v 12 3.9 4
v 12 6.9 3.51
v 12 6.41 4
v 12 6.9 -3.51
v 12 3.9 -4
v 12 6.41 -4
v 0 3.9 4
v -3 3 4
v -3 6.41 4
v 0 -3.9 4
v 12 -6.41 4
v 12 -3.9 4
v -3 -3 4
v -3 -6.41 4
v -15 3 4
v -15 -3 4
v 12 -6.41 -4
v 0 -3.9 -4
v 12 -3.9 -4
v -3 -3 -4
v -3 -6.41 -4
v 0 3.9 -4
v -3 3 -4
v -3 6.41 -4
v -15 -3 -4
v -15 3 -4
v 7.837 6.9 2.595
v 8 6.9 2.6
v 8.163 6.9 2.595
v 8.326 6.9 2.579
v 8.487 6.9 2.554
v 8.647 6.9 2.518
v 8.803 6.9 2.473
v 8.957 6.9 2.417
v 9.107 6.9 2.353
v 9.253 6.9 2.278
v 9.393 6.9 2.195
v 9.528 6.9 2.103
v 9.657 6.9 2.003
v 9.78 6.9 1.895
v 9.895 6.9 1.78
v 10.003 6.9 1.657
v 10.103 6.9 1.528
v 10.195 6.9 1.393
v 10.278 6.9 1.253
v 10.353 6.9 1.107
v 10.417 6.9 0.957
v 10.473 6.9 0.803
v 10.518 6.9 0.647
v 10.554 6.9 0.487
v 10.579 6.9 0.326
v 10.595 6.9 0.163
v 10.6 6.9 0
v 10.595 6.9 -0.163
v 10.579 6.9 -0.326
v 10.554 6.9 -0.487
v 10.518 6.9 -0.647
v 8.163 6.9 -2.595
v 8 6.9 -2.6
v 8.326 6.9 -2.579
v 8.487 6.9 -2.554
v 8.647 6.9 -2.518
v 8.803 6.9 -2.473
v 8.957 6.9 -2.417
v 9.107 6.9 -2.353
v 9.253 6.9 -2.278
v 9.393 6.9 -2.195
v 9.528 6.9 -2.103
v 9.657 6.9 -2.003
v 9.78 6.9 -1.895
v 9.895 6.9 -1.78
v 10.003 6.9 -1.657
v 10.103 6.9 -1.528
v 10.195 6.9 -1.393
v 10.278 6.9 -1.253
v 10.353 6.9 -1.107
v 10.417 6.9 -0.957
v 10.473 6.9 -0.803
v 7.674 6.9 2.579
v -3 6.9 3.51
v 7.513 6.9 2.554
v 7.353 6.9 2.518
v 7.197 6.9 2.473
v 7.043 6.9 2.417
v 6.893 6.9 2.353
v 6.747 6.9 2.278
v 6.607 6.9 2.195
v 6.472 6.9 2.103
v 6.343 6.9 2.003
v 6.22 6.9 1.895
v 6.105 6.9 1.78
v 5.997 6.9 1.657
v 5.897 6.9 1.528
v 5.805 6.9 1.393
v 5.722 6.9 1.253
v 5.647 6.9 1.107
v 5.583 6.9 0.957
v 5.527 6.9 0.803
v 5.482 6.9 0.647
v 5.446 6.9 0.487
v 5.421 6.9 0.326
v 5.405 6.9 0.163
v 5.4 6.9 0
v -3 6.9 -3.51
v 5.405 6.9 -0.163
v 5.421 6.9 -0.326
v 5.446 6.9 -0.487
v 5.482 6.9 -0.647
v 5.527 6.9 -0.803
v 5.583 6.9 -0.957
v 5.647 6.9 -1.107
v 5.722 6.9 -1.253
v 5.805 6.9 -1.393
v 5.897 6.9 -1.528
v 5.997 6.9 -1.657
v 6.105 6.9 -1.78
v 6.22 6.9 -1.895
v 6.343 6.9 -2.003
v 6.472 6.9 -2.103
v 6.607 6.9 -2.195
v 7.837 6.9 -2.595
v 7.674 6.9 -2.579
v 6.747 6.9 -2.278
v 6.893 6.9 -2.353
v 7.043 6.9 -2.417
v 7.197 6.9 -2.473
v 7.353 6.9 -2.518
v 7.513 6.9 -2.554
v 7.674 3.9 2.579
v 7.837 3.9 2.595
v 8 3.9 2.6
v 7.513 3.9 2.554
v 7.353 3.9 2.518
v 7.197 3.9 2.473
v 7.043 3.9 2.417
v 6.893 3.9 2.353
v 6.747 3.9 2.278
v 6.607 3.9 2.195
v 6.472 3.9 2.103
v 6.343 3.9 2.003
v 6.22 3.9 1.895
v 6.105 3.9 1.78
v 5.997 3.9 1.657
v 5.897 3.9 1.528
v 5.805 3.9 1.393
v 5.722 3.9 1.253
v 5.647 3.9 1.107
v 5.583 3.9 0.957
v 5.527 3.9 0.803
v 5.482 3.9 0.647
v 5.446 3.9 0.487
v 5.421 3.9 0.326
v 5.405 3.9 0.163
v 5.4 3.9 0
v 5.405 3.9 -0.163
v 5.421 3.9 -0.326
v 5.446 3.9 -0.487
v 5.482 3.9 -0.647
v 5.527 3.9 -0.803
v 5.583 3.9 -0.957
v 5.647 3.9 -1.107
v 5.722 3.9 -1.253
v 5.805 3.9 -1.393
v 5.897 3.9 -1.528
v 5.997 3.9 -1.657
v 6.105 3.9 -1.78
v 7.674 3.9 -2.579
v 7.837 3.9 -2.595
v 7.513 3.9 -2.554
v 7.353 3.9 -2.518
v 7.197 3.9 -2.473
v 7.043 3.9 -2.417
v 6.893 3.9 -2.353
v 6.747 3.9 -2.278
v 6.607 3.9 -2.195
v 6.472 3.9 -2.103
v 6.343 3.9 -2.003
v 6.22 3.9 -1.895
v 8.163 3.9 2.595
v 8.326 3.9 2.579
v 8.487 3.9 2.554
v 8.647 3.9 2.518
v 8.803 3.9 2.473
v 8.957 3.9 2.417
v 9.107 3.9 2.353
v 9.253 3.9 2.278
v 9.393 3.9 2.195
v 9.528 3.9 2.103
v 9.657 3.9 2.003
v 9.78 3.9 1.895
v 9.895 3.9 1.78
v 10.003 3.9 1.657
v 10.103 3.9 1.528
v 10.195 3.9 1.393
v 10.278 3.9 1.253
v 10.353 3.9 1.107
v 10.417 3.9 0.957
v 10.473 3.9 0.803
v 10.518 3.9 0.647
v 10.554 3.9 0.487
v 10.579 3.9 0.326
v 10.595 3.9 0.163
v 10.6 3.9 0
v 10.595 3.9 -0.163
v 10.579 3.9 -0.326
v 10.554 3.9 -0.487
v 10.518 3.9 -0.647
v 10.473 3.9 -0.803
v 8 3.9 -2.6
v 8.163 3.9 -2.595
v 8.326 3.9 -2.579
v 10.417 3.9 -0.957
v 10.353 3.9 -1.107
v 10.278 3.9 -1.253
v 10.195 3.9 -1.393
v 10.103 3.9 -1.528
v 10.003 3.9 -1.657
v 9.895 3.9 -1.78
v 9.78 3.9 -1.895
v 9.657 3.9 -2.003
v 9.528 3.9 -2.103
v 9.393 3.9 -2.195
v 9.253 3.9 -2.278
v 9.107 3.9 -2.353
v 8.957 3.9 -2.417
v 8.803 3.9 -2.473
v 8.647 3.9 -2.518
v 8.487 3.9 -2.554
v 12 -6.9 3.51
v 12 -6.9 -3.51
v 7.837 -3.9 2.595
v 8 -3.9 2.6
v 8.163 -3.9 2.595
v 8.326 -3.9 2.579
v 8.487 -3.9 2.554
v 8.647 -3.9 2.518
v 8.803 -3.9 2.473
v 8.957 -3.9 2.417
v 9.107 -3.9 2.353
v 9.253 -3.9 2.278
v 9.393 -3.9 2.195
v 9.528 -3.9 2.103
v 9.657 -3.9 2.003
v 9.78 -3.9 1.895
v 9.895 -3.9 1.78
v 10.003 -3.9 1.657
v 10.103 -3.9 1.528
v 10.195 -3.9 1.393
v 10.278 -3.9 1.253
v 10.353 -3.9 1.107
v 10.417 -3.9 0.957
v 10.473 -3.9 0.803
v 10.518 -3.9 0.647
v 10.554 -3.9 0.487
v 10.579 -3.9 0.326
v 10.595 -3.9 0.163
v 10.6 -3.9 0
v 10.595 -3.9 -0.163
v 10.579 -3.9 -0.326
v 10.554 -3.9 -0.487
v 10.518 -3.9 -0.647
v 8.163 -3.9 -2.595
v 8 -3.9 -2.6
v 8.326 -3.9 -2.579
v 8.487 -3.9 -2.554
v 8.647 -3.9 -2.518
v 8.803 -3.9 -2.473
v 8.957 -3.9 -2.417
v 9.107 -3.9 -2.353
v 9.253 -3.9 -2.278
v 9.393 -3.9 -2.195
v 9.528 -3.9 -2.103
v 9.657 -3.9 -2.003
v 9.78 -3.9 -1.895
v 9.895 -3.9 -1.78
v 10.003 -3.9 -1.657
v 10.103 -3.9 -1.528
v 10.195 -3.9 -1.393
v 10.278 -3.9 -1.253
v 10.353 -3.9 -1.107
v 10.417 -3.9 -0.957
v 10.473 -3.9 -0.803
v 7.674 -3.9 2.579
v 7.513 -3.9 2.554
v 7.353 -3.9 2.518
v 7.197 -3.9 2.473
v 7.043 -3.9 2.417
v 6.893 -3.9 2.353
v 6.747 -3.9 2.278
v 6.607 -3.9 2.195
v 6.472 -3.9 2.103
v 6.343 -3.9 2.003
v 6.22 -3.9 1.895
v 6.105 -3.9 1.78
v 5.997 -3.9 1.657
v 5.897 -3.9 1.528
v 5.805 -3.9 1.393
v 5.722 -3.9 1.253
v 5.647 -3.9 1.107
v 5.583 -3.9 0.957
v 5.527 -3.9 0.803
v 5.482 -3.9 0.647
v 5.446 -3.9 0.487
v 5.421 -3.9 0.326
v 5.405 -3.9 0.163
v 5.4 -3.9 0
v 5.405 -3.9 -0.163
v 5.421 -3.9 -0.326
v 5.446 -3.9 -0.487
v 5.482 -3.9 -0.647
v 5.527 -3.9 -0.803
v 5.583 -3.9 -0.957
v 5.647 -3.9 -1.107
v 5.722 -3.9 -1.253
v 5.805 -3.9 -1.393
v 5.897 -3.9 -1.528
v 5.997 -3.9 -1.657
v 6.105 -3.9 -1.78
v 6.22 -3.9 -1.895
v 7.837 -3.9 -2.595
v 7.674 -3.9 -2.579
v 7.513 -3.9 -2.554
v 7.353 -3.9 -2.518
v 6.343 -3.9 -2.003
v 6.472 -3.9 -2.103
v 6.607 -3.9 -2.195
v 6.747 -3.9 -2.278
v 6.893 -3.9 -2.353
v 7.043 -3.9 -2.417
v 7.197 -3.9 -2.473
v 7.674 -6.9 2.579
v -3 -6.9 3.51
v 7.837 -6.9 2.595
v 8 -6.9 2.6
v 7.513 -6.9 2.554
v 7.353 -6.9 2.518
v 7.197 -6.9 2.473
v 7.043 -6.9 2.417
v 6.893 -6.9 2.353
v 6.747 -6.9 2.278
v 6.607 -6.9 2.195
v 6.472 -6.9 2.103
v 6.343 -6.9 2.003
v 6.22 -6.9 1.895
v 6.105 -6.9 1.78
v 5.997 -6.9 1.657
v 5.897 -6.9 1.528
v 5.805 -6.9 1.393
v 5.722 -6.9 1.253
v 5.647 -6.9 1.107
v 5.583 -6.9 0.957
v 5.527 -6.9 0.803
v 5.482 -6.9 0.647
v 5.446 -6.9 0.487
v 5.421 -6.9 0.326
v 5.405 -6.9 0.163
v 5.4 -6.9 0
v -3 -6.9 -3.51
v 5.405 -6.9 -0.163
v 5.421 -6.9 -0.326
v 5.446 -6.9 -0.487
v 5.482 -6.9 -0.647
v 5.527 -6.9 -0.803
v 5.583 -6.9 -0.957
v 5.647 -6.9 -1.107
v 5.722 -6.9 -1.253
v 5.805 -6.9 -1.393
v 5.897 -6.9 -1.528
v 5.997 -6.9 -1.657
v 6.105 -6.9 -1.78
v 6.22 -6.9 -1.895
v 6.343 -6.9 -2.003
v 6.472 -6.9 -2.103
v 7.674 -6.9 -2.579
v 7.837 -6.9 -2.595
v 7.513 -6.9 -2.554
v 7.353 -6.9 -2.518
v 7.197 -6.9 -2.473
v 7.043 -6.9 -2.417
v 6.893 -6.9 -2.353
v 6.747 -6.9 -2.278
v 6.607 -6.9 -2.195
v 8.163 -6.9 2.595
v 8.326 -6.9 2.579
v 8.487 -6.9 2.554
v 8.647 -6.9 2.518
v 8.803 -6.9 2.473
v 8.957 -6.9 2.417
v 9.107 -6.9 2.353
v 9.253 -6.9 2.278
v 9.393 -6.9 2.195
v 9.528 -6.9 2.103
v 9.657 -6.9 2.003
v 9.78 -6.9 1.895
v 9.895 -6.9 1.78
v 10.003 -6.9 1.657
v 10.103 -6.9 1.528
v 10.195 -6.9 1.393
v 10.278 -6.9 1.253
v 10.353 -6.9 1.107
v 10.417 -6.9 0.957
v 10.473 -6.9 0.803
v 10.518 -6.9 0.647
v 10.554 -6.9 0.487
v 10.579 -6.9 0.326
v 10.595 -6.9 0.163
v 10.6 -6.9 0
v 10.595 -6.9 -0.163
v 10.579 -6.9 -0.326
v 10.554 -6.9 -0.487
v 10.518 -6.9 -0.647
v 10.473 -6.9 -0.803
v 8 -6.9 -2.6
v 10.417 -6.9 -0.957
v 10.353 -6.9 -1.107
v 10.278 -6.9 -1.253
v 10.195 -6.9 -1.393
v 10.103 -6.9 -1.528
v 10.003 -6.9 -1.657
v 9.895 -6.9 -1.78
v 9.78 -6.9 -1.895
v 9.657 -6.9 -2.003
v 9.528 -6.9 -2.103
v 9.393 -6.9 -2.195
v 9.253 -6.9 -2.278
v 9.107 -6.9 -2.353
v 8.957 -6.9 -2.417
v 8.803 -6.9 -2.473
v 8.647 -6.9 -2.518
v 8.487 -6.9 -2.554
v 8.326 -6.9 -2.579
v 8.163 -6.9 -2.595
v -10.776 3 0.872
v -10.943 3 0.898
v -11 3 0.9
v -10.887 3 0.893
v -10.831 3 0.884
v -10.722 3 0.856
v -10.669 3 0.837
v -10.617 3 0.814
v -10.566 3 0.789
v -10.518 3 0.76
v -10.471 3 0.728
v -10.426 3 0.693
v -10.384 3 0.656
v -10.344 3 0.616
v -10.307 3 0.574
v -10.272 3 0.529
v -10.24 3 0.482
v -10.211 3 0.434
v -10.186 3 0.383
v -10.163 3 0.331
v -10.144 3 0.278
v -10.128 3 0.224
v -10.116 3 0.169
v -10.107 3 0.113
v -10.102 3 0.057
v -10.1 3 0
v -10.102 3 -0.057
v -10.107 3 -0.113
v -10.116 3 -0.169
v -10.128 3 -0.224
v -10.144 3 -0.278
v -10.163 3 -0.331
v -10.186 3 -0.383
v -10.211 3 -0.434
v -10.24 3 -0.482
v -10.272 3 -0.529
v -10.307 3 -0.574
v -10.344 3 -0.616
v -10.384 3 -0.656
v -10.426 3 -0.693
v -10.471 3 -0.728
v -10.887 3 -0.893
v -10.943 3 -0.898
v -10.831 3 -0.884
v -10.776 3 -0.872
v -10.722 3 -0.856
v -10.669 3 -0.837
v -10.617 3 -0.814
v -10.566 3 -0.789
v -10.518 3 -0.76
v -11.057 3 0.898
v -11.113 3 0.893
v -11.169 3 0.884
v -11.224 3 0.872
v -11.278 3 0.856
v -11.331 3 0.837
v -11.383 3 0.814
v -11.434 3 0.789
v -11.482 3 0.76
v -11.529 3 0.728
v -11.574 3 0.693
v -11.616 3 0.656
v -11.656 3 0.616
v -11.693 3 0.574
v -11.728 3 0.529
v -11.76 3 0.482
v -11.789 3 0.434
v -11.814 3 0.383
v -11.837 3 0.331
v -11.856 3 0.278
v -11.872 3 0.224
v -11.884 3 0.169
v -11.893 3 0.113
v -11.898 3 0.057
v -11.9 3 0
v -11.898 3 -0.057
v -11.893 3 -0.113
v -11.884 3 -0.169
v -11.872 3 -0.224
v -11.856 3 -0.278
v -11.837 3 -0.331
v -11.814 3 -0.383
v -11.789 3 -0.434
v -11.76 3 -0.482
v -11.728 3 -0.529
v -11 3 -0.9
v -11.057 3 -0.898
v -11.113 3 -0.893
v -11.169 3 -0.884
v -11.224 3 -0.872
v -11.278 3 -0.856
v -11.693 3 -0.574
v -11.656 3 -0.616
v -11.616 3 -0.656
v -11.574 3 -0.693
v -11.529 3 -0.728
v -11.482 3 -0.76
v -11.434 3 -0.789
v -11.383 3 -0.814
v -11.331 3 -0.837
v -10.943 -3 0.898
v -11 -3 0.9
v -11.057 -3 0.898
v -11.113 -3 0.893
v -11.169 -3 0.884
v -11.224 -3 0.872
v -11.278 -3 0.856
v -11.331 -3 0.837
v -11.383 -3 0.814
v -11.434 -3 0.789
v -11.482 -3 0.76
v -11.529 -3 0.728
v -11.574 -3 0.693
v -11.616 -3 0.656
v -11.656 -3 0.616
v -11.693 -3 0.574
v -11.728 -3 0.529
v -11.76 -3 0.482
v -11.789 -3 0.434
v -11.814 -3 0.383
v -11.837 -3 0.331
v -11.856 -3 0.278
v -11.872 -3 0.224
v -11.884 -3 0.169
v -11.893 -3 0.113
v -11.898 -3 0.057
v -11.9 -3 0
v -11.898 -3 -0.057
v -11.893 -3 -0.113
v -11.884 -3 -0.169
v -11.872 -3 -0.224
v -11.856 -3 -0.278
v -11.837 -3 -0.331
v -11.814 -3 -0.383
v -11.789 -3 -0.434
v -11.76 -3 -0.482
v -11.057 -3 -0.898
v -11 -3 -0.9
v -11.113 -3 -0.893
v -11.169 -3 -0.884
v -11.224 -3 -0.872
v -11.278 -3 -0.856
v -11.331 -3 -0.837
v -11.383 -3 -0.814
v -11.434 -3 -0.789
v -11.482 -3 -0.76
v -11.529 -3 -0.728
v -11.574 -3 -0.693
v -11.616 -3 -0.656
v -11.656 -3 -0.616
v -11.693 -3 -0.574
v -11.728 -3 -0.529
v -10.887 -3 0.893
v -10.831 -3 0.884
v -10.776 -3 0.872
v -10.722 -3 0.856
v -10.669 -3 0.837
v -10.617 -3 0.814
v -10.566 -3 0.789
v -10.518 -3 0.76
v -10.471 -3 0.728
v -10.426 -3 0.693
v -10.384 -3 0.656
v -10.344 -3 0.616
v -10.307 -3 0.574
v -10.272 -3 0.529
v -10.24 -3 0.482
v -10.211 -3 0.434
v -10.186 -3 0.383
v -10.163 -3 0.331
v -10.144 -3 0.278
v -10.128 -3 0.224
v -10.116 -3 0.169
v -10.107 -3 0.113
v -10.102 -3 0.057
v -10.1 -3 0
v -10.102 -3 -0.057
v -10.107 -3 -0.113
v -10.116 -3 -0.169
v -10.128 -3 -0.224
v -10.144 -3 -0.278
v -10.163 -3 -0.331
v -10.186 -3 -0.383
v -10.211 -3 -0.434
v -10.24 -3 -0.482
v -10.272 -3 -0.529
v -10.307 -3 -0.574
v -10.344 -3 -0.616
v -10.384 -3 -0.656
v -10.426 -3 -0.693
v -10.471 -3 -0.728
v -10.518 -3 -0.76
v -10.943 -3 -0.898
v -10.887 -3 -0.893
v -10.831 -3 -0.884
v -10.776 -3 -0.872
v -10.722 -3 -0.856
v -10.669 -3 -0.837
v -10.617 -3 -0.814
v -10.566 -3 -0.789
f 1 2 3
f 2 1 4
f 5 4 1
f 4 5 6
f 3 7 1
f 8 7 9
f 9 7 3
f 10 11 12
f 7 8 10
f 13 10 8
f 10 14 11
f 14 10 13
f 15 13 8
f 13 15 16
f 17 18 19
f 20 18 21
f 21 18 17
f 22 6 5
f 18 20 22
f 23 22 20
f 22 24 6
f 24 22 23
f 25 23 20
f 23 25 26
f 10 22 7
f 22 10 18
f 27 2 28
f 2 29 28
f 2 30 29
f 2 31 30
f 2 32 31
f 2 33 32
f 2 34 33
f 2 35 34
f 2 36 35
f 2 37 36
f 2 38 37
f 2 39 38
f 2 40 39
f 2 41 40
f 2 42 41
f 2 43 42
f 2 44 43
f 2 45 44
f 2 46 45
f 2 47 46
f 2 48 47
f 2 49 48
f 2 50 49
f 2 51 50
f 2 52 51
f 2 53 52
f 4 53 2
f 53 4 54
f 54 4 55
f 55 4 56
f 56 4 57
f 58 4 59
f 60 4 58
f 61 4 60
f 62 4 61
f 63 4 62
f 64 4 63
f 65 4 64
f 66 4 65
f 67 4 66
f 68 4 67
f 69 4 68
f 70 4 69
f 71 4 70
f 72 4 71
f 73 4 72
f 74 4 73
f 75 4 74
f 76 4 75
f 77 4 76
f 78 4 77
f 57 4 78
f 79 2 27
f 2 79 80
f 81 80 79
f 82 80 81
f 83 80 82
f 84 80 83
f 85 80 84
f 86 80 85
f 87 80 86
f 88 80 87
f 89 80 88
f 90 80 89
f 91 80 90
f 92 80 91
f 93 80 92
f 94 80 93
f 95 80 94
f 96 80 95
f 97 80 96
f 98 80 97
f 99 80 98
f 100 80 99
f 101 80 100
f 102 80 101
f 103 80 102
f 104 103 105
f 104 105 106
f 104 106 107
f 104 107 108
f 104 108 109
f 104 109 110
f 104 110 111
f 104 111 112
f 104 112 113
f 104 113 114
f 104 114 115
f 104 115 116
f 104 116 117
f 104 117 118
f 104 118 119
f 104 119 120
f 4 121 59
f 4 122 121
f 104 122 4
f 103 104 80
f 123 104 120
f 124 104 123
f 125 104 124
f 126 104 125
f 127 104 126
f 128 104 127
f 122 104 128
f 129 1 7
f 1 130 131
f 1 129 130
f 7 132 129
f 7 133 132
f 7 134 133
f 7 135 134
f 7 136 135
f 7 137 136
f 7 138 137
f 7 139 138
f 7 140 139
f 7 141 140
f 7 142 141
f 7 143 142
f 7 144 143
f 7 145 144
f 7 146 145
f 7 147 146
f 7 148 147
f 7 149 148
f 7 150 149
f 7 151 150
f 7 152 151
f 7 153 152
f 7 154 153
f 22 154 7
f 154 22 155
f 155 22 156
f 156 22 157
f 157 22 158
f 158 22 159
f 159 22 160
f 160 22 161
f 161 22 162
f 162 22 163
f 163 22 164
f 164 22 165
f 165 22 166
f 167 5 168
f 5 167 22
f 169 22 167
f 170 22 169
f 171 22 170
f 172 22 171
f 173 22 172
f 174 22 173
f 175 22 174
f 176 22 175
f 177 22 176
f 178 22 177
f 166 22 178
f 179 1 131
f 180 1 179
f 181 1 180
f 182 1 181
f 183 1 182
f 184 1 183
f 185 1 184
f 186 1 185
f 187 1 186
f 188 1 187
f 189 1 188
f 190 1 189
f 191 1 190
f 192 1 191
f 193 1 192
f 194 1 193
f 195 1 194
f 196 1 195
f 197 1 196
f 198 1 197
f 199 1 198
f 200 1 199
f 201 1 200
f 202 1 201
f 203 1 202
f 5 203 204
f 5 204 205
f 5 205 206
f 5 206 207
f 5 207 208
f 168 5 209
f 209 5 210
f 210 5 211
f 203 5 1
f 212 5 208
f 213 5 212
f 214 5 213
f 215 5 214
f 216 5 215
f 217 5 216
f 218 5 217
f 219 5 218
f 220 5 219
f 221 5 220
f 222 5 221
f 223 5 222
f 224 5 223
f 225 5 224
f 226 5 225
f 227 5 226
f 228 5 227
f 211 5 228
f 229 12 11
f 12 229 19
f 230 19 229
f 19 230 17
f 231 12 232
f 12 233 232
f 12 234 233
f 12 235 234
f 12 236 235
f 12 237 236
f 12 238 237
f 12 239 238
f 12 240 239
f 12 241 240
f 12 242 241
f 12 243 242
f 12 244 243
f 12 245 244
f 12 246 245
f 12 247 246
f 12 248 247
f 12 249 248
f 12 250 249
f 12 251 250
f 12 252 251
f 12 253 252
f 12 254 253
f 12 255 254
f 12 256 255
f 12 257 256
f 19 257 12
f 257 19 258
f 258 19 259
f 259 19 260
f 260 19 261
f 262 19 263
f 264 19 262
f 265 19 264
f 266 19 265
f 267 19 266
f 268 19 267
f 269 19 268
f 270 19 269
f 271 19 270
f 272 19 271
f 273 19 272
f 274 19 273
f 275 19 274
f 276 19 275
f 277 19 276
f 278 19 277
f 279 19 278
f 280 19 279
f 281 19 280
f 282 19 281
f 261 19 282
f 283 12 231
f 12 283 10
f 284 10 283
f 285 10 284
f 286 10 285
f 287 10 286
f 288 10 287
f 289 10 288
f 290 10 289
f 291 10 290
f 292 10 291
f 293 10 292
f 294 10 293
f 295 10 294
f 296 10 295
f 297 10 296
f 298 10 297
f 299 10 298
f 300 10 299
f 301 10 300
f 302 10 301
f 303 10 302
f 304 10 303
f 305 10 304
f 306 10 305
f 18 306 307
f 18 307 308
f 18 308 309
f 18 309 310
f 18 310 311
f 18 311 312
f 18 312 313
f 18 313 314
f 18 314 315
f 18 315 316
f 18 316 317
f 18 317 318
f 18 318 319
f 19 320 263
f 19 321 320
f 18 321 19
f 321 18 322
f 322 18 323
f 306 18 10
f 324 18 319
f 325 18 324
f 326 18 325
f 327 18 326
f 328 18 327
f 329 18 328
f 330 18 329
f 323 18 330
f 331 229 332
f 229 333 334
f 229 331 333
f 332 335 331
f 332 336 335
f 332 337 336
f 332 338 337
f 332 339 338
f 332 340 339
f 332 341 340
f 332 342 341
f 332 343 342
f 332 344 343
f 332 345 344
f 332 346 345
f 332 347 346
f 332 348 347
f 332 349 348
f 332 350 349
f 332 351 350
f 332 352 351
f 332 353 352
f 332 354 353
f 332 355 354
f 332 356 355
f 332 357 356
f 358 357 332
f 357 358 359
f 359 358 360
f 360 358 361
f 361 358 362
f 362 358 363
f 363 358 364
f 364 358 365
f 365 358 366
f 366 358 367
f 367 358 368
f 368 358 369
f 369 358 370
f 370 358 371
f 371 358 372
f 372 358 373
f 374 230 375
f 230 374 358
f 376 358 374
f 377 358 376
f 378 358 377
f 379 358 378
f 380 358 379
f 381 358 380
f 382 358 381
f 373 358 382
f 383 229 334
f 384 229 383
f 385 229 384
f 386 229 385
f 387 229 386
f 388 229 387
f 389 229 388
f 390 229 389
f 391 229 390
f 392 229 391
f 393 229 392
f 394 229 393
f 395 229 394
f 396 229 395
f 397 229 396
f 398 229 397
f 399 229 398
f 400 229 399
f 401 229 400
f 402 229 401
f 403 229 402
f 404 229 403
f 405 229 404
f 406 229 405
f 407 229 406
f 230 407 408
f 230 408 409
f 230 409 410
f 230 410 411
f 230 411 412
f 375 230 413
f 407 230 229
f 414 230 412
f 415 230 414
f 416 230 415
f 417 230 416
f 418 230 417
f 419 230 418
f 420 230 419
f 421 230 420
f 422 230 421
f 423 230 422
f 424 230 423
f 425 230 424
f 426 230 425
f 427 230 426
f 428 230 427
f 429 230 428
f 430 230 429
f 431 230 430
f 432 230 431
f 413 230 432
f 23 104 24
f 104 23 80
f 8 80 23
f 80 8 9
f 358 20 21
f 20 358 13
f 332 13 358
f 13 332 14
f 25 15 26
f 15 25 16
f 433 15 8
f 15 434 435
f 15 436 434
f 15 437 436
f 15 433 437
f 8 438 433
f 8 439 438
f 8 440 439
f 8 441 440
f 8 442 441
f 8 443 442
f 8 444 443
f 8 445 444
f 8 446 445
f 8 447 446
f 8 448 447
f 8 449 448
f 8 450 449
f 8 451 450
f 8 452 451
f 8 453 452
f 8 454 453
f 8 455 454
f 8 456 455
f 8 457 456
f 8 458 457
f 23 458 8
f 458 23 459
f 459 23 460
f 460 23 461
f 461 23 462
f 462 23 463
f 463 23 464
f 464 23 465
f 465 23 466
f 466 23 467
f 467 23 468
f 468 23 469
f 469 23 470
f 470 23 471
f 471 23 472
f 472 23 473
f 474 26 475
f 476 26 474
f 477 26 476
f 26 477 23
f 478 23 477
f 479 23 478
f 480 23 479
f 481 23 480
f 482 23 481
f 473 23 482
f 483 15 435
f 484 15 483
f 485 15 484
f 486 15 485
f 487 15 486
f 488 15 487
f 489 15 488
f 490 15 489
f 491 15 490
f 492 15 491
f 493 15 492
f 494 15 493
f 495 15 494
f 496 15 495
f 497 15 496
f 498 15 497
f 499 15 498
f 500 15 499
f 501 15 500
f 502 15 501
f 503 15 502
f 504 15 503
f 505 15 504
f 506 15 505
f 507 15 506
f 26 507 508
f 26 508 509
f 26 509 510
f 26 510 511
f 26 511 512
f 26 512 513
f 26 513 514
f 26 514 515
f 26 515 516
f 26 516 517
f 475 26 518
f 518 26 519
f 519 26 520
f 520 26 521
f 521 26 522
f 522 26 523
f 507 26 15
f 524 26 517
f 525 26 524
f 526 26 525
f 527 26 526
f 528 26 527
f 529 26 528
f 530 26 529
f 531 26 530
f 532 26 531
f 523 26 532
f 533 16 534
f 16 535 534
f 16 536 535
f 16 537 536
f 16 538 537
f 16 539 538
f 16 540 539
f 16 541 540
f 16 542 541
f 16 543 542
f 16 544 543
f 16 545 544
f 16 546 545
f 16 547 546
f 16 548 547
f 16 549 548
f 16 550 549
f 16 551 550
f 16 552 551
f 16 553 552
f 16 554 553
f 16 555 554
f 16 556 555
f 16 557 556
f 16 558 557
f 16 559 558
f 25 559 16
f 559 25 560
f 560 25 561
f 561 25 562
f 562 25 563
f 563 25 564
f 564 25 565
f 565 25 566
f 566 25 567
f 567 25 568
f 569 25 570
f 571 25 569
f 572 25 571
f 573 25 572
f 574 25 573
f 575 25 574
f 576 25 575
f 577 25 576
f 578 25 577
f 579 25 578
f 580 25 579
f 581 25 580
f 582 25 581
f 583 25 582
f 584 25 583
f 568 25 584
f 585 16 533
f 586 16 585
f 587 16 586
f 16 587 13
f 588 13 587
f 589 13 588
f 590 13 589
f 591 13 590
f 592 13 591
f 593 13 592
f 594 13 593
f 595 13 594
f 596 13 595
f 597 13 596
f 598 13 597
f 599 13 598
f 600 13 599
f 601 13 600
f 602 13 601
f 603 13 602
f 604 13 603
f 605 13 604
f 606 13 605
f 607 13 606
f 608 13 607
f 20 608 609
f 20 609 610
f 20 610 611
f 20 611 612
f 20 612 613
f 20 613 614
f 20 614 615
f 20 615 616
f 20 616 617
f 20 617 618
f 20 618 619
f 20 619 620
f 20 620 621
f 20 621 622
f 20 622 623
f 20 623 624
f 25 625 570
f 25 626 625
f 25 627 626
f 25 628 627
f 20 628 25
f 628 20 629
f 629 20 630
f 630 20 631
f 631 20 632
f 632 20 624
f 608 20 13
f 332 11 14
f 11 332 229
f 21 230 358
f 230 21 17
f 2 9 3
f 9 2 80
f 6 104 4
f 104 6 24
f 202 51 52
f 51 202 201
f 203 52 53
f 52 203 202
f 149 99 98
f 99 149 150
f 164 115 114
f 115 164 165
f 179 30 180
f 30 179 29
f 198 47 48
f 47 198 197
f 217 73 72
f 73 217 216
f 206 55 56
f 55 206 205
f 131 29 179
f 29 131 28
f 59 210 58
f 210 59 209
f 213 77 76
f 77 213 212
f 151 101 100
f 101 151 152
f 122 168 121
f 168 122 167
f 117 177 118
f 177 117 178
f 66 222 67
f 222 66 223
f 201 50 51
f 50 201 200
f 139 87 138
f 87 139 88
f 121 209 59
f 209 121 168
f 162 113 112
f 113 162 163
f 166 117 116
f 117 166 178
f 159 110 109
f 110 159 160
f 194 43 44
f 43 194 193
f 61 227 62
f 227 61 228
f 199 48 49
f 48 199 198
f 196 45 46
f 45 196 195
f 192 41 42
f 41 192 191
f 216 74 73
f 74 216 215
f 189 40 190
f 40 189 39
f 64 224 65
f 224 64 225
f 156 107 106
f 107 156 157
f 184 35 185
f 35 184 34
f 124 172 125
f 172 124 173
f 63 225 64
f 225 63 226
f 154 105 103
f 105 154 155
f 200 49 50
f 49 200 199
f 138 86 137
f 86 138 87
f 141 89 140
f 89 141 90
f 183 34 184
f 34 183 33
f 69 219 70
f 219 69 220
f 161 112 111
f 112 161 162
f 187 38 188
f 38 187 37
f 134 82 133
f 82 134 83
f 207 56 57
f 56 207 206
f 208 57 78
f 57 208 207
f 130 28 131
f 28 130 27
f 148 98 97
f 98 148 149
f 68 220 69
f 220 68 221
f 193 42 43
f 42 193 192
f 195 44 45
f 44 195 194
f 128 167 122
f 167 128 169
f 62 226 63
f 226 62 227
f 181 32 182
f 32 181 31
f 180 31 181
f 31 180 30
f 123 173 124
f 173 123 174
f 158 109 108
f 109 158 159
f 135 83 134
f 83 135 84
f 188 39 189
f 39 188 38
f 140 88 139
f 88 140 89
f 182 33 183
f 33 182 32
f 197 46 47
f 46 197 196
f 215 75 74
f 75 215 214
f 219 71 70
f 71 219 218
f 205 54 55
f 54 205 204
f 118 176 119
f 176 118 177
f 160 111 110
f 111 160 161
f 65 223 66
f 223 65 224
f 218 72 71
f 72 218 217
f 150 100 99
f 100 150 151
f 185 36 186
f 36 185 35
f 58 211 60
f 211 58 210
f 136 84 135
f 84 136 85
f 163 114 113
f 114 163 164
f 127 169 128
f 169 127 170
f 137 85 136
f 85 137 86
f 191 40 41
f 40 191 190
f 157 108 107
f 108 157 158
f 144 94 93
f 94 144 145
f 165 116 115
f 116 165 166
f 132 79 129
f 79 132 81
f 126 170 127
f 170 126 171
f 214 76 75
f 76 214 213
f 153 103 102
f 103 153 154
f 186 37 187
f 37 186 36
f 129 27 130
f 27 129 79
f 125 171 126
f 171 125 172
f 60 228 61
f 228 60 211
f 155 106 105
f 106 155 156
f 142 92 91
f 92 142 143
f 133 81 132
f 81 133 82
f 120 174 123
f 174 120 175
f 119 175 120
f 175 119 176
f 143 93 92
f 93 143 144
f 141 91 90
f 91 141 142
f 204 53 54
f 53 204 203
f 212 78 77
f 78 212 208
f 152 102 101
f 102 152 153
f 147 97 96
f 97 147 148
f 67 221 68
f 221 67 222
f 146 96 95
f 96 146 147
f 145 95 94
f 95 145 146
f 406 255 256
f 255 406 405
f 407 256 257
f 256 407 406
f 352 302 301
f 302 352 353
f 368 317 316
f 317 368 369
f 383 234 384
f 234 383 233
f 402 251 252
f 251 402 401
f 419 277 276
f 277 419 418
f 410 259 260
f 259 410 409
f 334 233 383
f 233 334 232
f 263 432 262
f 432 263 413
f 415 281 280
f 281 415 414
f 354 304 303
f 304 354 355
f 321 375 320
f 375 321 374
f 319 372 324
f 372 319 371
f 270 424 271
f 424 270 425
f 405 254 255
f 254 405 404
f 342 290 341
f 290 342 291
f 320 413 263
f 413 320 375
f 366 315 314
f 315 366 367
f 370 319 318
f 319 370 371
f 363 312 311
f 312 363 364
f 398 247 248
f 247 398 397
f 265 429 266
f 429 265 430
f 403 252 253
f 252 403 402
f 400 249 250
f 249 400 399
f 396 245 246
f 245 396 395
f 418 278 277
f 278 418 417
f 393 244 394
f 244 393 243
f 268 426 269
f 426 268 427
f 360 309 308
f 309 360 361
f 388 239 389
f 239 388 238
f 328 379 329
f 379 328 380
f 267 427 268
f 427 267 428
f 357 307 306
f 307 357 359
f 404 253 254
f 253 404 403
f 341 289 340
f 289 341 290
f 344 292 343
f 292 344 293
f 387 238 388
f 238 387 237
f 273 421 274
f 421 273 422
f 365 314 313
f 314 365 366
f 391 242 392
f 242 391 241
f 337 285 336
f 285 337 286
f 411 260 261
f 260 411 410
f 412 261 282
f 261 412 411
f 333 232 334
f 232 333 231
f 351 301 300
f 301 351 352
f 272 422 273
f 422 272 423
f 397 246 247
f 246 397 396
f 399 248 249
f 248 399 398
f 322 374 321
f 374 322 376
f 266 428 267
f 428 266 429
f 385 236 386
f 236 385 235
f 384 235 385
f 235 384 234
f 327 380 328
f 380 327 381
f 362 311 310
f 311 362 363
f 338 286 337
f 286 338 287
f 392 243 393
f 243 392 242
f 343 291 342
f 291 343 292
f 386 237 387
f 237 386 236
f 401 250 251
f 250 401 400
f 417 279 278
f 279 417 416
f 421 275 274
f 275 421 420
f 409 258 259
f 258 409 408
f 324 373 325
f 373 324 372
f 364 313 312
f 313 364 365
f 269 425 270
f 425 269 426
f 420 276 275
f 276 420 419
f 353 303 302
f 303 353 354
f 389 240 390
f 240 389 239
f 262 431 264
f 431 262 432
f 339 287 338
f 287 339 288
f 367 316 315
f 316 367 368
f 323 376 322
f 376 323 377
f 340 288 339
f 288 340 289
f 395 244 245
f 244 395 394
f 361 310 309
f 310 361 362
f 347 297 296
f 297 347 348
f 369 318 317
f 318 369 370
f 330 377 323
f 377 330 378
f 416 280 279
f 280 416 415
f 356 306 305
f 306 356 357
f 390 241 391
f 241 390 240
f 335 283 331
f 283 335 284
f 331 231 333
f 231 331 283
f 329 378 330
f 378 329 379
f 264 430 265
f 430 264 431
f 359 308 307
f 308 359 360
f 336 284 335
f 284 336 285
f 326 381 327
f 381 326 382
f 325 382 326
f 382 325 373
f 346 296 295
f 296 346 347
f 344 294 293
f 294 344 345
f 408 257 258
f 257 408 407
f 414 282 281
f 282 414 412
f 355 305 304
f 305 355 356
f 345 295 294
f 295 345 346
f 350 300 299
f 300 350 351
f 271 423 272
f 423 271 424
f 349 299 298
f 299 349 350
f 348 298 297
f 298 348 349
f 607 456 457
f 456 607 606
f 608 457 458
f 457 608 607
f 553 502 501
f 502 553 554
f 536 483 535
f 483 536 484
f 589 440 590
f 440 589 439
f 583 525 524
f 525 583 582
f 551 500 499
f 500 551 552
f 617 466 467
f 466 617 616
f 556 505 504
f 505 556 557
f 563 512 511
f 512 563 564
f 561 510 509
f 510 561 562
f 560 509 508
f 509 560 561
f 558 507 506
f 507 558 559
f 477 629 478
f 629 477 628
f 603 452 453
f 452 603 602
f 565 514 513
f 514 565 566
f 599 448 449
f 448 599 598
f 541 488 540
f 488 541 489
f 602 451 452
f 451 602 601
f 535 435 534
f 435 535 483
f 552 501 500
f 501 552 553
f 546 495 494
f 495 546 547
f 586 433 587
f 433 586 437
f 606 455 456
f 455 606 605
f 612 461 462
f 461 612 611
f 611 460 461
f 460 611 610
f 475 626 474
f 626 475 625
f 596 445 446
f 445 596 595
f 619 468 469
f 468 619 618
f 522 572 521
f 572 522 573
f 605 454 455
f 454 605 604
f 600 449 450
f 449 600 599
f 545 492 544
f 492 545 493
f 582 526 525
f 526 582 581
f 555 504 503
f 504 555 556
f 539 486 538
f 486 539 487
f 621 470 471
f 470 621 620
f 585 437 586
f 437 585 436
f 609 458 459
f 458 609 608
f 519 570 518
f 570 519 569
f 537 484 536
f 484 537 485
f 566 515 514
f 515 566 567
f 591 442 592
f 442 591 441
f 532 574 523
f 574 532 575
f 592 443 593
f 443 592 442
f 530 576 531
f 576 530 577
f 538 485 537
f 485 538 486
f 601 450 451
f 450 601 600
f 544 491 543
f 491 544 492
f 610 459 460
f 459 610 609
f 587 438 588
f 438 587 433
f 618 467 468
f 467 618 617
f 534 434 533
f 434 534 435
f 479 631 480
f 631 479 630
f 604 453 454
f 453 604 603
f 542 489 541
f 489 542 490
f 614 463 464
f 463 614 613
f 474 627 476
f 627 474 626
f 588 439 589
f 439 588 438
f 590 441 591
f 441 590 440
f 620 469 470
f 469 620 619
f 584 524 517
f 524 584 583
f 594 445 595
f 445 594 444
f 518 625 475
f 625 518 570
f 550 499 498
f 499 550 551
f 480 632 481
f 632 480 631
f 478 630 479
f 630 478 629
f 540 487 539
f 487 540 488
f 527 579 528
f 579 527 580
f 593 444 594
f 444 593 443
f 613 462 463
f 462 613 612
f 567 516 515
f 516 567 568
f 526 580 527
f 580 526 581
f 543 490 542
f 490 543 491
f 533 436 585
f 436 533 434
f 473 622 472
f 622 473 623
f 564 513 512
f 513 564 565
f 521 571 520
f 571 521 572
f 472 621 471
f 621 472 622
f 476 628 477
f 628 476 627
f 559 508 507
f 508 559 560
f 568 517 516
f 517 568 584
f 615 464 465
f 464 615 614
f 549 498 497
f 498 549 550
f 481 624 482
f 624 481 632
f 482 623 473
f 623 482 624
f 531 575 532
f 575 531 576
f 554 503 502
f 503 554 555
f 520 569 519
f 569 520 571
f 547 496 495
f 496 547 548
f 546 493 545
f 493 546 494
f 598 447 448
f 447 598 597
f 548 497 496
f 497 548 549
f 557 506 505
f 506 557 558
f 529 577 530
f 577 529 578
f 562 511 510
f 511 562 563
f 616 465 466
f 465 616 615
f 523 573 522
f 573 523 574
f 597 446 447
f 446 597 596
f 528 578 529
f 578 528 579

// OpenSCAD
// file: ../lib/bevel.scad
/*
 * Copyright (c) 2019, Vigibot
 * All rights reserved.
 * 
 * Redistribution and use in source and binary forms, with or without modification, are permitted provided that the following conditions are met:
 *   * Redistributions of source code must retain the above copyright notice, this list of conditions and the following disclaimer.
 *   * Redistributions in binary form must reproduce the above copyright notice, this list of conditions and the following disclaimer in the documentation and/or other materials provided with the distribution.
 * 
 * Description: OpenSCAD API for beveling
 * Design:      Gilles Bouissac
 * Author:      Gilles Bouissac
 */

use <extensions.scad>

MFG = 0.01; // 2 Manifold Guard
RADIUSBEVEL = 0.5; // Default radius bevel
CUTTER_W    = 1;

function getRadiusBevel() = RADIUSBEVEL;

// ----------------------------------------
//                  API
// ----------------------------------------

// Double diagonal bevels distant from width extruded in line
module bevelCutLinear( length, width, b=RADIUSBEVEL ) {
    // Cutter
    translate ( [-width/2-MFG, -CUTTER_W, 0] )
        cube( [width+2*MFG,CUTTER_W,length+2*MFG] );
    // Bevel
    mirrorY()
    translate ( [-width/2, 0, -MFG] )
    linear_extrude( height=length+2*MFG )
        bevelDiagonalSection ( b );
}

// Double diagonal bevels distant from width extruded in quater of circle
module bevelCutArc( radius, width, b=RADIUSBEVEL ) {
    // Cutter
    cutterCubeW = radius+CUTTER_W;
    translate ( [-radius, -radius, 0] )
        difference() {
            translate ( [cutterCubeW/2, cutterCubeW/2, 0] )
                cube( [cutterCubeW,cutterCubeW,width+2*MFG], center=true );
            cylinder( r=radius, h=width+4*MFG, center=true );
        }
    // Bevel
    mirrorZ()
    translate ( [-radius, -radius, 0] )
    rotate_extrude( angle=90 )
        translate ( [radius, width/2, 0] )
        rotate( [0,0,180] )
        bevelDiagonalSection ( b );
}
//
// ----------------------------------------
//            Implementation
// ----------------------------------------

// Section of a diagonal (linear 45 deg) bevel
module bevelDiagonalSection ( radius ) {
    polygon([
        [-MFG,       -MFG],
        [radius,     -MFG],
        [-MFG,       radius],
    ]);
}

// ----------------------------------------
//                 Showcase
// ----------------------------------------
translate ( [5, 0, 0] )
rotate( [90,0,0] )
rotate( [0,0,90] )
bevelCutLinear( 20, 2 );

translate ( [5, 5, 0] )
bevelCutArc( 5, 2, $fn=100 );
// file: ../lib/extensions.scad
/*
 * Copyright (c) 2019, Vigibot
 * All rights reserved.
 * 
 * Redistribution and use in source and binary forms, with or without modification, are permitted provided that the following conditions are met:
 *   * Redistributions of source code must retain the above copyright notice, this list of conditions and the following disclaimer.
 *   * Redistributions in binary form must reproduce the above copyright notice, this list of conditions and the following disclaimer in the documentation and/or other materials provided with the distribution.
 * 
 * Description: OpenSCAD extensions to scad language
 * Design:      Gilles Bouissac
 * Author:      Gilles Bouissac
 */


// Render children modules with mirroring on plane [XZ]
//   Each child is rendered 2 times
module mirrorX( mirrorx=true ) {
    mirror([0, 0, 0])
        children();
    if ( mirrorx )
        mirror([0, 1, 0])
            children();
}

// Render children modules with mirroring on plane [YZ]
//   Each child is rendered 2 times
module mirrorY( mirrory=true ) {
    mirror([0, 0, 0])
        children();
    if ( mirrory )
        mirror([1, 0, 0])
            children();
}

// Render children modules with mirroring on plane [XY]
//   Each child is rendered 2 times
module mirrorZ( mirrorz=true ) {
    mirror([0, 0, 0])
        children();
    if ( mirrorz )
        mirror([0, 0, 1])
            children();
}

// Render children modules with mirroring on X then mirroring on Y
//   Each child is rendered 4 times
module mirrorXY( mirrorx=true, mirrory=true ) {
    mirrorY(mirrory)
        mirrorX(mirrorx)
            children();
}

// flatten([[0,1],[2,3]]) => [0,1,2,3]
function flatten(list) = [ for (i = list, v = i) v ];
// main file
use <../lib/extensions.scad>
use <../lib/bevel.scad>

PRECISION = 100;

$fn = PRECISION;

HEIGHT = 8;
LENGTH = 12;
STANDWIDTH = 6;
ARMWIDTH = 3;
JOINTWIDTH = 3;
SPACE = 1.8; 
AXISOFFSET = 4;
ARMRADIUSHOLE = 2.6;
STANDRADIUSHOLE = 0.9;

module plate() {
 translate([LENGTH / 2 , ARMWIDTH/2 + STANDWIDTH/2 + SPACE/2, 0]) {  
  cube([LENGTH ,
        ARMWIDTH,
        HEIGHT], center = true);
 }
 translate([LENGTH / 2 , -(ARMWIDTH/2 + STANDWIDTH/2 + SPACE/2), 0]) {  
  cube([LENGTH ,
        ARMWIDTH,
        HEIGHT], center = true);
 }
 translate([-LENGTH / 2 - JOINTWIDTH , 0, 0]) {  
  cube([LENGTH ,
        STANDWIDTH,
        HEIGHT], center = true);
 }
 translate([- JOINTWIDTH /2 , 0, 0]) {  
  cube([JOINTWIDTH ,
        2 * ARMWIDTH + STANDWIDTH + SPACE,
        HEIGHT], center = true);
 }
}

module bevels() {
    translate([-ARMWIDTH , -(ARMWIDTH + STANDWIDTH/2 + SPACE/2), 0]) {  
        rotate([0,90,0])
            bevelCutLinear(LENGTH+ARMWIDTH,HEIGHT);
    }
}

module holes() {
 translate([LENGTH - AXISOFFSET , ARMWIDTH/2 + STANDWIDTH/2 + SPACE/2, 0]) {
  rotate([90,0,0]) {
   cylinder(r = ARMRADIUSHOLE, h = ARMWIDTH, center = true);
  }
 }
 translate([LENGTH - AXISOFFSET , -(ARMWIDTH/2 + STANDWIDTH/2 + SPACE/2), 0]) {
  rotate([90,0,0]) {
   cylinder(r = ARMRADIUSHOLE, h = ARMWIDTH, center = true);
  }
 }
 translate([-LENGTH - JOINTWIDTH + AXISOFFSET ,0, 0]) {
  rotate([90,0,0]) {
   cylinder(r = STANDRADIUSHOLE, h = STANDWIDTH, center = true);
  }
 }
}


difference() {
 plate();
 mirrorX()
    bevels();
 holes();
}
